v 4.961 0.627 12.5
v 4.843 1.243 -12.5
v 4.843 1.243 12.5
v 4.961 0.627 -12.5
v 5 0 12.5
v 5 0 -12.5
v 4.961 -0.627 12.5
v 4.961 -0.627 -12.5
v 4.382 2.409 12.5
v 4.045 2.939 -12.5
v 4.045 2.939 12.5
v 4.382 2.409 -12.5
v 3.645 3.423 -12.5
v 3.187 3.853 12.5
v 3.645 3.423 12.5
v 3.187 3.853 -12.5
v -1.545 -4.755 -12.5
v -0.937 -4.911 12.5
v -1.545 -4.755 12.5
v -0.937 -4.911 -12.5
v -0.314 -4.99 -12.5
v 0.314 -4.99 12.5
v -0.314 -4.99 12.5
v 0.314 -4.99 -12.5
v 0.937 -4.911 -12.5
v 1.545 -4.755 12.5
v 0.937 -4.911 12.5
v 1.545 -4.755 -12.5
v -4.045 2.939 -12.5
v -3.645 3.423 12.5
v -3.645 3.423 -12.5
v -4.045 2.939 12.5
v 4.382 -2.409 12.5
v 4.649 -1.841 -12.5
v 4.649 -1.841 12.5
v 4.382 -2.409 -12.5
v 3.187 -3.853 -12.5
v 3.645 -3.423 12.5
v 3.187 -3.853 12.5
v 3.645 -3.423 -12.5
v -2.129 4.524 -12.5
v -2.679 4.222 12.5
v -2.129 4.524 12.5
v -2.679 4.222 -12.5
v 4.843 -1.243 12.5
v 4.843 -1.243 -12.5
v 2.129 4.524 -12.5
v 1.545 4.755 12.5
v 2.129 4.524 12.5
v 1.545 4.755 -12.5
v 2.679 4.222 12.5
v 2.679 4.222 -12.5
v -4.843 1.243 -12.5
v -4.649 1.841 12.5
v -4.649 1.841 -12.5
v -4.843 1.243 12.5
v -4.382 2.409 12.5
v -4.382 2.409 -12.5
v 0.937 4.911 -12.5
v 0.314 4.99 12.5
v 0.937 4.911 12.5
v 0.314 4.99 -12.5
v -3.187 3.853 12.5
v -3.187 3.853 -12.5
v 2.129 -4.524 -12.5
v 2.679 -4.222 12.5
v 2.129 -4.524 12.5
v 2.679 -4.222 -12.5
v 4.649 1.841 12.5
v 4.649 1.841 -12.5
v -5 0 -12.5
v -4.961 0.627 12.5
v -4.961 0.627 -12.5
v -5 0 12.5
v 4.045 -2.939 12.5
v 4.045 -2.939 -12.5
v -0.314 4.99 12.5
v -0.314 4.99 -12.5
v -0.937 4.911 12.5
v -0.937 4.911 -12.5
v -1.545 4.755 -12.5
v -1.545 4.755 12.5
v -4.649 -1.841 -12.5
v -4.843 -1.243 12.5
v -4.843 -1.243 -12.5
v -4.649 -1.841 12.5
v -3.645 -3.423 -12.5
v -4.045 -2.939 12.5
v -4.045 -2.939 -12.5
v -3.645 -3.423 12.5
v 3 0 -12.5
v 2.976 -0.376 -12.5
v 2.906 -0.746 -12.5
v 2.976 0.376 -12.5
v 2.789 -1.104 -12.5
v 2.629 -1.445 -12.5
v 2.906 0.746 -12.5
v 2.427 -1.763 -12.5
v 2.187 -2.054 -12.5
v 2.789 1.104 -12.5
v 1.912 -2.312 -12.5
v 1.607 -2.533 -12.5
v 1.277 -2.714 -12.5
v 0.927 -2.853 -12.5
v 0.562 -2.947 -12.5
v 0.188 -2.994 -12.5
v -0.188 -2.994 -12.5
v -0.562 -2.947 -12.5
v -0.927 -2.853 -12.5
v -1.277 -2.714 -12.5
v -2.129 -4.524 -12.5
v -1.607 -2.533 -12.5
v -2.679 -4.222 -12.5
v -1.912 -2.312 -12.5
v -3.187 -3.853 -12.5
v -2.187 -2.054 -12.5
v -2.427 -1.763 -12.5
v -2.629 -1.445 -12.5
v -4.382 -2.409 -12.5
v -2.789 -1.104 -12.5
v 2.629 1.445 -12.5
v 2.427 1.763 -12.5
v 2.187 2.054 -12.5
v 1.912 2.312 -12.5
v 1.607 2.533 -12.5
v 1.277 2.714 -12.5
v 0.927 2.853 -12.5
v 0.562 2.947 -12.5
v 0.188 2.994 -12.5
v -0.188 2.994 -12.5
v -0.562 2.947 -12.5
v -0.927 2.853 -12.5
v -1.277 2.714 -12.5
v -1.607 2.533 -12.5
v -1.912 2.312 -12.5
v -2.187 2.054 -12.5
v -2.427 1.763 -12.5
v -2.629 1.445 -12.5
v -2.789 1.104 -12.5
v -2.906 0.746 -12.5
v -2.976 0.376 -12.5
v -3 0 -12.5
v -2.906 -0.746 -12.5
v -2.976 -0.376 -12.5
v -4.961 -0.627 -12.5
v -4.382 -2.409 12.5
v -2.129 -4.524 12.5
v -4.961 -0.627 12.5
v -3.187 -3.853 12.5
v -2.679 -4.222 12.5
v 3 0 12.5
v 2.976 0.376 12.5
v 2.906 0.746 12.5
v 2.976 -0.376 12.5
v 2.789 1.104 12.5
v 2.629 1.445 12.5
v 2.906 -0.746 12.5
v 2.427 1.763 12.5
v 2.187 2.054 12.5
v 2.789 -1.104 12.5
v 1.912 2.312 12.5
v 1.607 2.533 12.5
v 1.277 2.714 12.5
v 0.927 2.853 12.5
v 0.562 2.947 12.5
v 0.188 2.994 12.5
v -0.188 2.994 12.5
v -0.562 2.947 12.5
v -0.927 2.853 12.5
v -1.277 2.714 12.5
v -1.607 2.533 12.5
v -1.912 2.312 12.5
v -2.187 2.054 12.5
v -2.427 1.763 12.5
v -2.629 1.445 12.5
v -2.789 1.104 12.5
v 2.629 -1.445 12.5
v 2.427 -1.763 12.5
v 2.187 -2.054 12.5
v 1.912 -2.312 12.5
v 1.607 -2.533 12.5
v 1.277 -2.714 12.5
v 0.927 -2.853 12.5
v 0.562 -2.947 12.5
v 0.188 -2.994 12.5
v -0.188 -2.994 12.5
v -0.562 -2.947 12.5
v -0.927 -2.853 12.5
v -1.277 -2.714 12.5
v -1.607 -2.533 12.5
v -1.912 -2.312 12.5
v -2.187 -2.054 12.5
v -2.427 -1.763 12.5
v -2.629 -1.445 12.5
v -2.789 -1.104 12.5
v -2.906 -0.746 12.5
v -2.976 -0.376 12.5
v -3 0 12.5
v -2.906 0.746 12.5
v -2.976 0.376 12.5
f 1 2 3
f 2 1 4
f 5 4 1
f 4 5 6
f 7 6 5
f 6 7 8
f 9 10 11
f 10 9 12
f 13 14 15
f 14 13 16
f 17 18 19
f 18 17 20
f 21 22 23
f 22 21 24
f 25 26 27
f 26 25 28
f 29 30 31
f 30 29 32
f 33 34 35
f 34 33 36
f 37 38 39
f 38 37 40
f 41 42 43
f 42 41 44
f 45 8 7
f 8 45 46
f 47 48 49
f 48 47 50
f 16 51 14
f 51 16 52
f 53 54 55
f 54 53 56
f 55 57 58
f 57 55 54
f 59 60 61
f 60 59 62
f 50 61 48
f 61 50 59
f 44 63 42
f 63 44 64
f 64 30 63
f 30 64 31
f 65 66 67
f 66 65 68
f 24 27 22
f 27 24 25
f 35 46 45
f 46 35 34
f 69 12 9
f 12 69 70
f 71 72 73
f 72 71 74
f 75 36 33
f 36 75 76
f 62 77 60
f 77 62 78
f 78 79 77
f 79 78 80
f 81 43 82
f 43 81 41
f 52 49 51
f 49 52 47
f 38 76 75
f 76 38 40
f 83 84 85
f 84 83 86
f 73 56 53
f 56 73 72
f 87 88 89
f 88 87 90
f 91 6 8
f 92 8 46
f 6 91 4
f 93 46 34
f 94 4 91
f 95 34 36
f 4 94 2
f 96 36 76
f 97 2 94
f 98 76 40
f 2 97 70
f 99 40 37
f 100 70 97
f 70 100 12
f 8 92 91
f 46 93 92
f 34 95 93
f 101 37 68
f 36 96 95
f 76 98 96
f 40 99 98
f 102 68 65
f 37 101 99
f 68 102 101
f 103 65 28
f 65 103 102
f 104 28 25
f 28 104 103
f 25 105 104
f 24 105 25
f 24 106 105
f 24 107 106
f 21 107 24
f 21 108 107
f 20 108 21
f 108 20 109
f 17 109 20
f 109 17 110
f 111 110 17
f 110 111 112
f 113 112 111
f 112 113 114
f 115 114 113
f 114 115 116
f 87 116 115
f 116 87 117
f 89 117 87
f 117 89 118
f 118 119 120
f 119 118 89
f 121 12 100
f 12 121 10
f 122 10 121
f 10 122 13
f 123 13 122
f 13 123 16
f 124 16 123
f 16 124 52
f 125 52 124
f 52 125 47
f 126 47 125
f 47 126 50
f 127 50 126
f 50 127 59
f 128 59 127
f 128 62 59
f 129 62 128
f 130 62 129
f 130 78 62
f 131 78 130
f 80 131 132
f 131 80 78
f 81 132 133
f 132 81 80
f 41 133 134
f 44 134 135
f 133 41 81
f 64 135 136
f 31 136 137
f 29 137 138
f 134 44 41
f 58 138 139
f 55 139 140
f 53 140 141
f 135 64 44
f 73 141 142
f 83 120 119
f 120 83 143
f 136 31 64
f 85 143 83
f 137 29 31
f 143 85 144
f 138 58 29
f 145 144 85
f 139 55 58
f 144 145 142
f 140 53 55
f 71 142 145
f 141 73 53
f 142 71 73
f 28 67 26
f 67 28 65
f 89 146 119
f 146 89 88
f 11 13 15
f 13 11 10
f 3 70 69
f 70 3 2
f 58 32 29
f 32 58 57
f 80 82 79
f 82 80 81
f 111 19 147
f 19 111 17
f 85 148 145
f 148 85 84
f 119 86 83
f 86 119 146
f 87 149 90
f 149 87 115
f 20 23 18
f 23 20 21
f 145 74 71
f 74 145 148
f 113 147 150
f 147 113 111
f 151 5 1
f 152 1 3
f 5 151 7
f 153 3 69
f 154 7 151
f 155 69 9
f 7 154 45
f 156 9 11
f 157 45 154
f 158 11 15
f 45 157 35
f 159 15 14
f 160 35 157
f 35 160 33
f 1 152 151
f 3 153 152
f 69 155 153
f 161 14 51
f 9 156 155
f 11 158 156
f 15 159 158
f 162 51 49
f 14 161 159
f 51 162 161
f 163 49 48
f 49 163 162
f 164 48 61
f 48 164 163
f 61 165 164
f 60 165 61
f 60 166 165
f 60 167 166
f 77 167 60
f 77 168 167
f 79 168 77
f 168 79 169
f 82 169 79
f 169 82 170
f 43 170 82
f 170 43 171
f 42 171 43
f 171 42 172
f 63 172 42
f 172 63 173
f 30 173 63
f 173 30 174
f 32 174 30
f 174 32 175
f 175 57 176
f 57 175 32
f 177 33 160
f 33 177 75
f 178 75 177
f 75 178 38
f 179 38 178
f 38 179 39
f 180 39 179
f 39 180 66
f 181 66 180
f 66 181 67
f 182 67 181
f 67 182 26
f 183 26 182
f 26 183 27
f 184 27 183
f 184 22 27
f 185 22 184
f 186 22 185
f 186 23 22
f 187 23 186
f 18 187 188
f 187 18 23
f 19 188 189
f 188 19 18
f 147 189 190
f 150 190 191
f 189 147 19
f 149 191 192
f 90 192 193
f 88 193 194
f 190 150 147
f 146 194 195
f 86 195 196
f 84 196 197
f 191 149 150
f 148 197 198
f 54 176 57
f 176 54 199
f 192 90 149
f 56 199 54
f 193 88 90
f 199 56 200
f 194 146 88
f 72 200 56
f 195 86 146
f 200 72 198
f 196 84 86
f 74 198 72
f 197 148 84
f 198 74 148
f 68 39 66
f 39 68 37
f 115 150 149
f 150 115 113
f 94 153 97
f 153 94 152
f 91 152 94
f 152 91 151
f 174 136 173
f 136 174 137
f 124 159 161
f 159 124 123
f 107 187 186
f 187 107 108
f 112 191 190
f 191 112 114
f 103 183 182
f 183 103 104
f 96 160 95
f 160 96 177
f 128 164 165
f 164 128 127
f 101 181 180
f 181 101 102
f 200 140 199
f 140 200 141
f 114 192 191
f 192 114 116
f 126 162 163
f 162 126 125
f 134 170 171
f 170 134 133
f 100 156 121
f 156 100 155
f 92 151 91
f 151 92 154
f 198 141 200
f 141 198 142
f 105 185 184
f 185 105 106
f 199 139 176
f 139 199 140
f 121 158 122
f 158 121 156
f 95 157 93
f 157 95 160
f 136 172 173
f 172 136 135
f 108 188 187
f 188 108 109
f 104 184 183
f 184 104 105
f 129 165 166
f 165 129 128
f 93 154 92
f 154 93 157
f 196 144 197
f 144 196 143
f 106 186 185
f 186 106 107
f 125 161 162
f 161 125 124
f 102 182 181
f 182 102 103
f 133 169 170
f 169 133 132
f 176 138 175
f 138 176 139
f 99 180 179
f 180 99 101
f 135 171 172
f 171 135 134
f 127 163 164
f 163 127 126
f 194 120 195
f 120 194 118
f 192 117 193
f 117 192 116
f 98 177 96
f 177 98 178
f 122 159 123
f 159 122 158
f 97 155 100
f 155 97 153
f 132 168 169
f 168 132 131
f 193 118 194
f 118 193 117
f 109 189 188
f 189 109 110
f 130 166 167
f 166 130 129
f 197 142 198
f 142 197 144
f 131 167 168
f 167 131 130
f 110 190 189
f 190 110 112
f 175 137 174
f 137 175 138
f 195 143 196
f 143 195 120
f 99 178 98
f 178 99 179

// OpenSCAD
$fn = 50;


difference() {
	union() {
		translate(v = [0, 0, -12.5000000000]) {
			cylinder(h = 25, r = 5.0000000000);
		}
	}
	union() {
		translate(v = [0, 0, -100.0000000000]) {
			cylinder(h = 200, r = 3.0000000000);
		}
	}
}
